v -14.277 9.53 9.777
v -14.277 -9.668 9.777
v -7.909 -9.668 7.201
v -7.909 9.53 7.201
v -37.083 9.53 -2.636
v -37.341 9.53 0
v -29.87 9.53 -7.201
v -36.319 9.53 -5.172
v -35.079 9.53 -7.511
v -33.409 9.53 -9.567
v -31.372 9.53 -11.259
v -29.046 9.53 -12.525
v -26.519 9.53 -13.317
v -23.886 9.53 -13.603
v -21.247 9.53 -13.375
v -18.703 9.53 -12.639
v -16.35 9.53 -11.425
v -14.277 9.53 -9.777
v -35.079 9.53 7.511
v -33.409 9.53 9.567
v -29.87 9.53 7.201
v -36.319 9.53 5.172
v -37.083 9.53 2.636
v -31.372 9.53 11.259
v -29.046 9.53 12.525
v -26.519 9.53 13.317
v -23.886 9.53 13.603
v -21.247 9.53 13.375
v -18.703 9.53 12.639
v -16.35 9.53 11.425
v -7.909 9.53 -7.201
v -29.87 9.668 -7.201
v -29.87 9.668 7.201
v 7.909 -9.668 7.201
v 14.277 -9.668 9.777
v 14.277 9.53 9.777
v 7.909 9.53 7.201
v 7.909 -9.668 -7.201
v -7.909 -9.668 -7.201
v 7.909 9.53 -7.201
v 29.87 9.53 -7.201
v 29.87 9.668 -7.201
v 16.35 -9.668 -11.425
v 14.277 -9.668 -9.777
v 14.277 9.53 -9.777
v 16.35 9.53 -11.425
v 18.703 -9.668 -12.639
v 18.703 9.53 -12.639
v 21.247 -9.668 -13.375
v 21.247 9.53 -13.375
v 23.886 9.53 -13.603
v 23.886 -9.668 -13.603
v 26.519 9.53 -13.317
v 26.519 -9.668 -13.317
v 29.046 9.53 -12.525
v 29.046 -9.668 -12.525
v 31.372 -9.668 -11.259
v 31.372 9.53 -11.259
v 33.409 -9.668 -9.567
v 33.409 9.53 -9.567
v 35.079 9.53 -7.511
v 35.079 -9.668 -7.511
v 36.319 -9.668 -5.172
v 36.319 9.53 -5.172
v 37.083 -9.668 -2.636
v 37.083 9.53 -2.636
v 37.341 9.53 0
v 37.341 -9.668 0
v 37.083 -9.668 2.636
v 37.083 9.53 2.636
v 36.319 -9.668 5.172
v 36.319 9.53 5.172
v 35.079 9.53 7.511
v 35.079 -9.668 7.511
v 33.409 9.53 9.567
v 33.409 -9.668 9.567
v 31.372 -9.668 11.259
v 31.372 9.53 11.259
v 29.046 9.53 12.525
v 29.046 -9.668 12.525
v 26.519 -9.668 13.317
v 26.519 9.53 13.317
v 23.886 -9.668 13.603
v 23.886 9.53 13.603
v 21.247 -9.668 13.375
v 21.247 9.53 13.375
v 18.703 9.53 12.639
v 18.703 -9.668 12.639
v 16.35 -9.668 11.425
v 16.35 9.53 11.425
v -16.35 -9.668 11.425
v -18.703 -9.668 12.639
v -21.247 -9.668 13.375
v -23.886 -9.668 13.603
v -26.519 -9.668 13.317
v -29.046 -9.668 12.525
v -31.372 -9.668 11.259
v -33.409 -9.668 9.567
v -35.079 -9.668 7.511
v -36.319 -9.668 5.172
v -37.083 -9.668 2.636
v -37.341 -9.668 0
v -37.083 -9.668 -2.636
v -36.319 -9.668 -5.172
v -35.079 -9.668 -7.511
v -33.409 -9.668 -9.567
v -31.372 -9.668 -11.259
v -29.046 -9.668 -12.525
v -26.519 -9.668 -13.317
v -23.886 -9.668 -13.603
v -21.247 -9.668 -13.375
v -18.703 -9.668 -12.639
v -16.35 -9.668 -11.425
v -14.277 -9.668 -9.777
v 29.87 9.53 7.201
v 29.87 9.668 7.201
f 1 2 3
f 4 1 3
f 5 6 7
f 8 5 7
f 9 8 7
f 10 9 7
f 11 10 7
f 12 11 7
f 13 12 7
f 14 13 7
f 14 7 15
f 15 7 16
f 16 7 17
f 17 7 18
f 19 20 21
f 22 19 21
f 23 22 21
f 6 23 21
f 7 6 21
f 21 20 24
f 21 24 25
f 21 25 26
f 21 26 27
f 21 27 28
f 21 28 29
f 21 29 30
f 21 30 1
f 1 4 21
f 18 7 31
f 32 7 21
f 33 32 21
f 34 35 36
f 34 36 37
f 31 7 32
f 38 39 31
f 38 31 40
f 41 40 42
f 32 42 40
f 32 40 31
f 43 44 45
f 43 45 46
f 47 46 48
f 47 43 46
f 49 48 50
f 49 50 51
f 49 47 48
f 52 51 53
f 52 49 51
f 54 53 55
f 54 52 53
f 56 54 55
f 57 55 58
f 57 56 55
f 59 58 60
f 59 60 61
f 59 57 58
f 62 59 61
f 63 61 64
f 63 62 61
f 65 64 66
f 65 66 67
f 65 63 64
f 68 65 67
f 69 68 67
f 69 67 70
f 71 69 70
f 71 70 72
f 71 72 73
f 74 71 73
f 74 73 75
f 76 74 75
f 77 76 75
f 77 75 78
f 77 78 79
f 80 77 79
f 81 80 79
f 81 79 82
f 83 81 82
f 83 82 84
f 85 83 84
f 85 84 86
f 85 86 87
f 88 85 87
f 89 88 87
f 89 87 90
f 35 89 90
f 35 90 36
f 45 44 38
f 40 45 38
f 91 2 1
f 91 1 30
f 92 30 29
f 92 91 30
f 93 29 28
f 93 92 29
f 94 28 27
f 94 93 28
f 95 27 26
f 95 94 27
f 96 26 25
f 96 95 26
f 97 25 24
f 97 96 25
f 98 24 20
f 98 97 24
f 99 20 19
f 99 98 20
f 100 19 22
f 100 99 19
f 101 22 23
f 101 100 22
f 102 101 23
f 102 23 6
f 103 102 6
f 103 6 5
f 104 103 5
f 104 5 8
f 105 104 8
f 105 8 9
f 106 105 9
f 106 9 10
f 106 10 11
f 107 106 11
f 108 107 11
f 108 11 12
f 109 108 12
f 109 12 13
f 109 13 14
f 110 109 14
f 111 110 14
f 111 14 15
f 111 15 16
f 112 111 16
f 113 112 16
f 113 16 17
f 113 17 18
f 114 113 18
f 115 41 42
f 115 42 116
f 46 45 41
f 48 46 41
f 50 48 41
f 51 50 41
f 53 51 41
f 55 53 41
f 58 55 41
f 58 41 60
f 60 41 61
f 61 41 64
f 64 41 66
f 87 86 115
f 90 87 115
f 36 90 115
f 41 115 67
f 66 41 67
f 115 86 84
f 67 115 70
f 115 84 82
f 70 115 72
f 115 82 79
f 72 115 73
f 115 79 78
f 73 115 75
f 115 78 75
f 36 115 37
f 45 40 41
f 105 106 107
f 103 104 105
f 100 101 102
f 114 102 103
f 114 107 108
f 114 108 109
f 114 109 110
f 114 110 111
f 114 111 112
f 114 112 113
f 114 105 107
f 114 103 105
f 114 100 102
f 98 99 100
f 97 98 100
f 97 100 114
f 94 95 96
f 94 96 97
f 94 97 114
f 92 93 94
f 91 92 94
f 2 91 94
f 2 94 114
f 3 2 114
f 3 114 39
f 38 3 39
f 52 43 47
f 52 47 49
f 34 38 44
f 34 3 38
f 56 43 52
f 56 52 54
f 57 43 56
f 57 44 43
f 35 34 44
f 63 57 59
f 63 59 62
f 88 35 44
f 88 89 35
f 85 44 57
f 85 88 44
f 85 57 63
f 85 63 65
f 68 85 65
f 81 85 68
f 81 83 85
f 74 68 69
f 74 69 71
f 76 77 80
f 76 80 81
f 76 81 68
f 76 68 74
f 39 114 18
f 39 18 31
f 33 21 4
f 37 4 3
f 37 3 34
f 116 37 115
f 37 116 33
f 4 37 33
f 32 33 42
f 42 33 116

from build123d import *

# Parameters (mm, degrees)
F0_W        = 59.7408041358
F0_H        = 14.4018009305
F1_DEPTH    = 9.66812
F2_R        = 13.6043152125
F3_DEPTH    = 19.19795
F4_T1_DEPTH = 19.19795


# Not quite as in the source:
# - a fillet or chamfer that OpenCascade refuses, or shapes differently, is made with other operations: its cross-section is extruded or revolved along the edge and cut away or added


with BuildPart() as f1:
    # F0 (on Front) → F1 (new body, symmetric)
    with BuildSketch(Plane.XZ):
        Rectangle(F0_W, F0_H)
    extrude(amount=F1_DEPTH, both=True)

    # F2 (on face) → F3 (join)
    with BuildSketch(Plane.XZ.offset(9.66812)):
        with Locations((-23.7363018095, 0)):
            Circle(F2_R)
        with Locations((23.7363018095, 0)):
            Circle(F2_R)
    extrude(amount=-F3_DEPTH)

    # F4: chamfer of 5.08 on 4 edges, made by hand

    # F4_s2 → F4_t1 (join)
    with BuildSketch(Plane.XZ.offset(-9.52983)):
        with BuildLine():
            Line((14.4648728864, 9.8532071559), (7.7209301601, 7.1246894588))
            Line((7.7209301601, 7.1246894588), (7.7209301601, 7.0230894588))
            ThreePointArc((7.7209301601, 7.0230894588), (9.9574717116, 7.0993004653), (12.194013263, 7.0993004653))
            Line((12.194013263, 7.0993004653), (12.2802135971, 7.1471225664))
            ThreePointArc((12.2802135971, 7.1471225664), (13.291854629, 8.5578526047), (14.5355207103, 9.7801904113))
            Line((14.5355207103, 9.7801904113), (14.4648728864, 9.8532071559))
        make_face()
        with BuildLine():
            Line((-14.4648728864, 9.8532071559), (-7.7209301601, 7.1246894588))
            Line((-7.7209301601, 7.1246894588), (-7.7209301601, 7.0230894588))
            ThreePointArc((-7.7209301601, 7.0230894588), (-9.9574717116, 7.0993004653), (-12.194013263, 7.0993004653))
            Line((-12.194013263, 7.0993004653), (-12.2802135971, 7.1471225664))
            ThreePointArc((-12.2802135971, 7.1471225664), (-13.291854629, 8.5578526047), (-14.5355207103, 9.7801904113))
            Line((-14.5355207103, 9.7801904113), (-14.4648728864, 9.8532071559))
        make_face()
        with BuildLine():
            Line((14.4648728864, -9.8532071559), (7.7209301601, -7.1246894588))
            Line((7.7209301601, -7.1246894588), (7.7209301601, -7.0230894588))
            ThreePointArc((7.7209301601, -7.0230894588), (9.9574717116, -7.0993004653), (12.194013263, -7.0993004653))
            Line((12.194013263, -7.0993004653), (12.2802135971, -7.1471225664))
            ThreePointArc((12.2802135971, -7.1471225664), (13.291854629, -8.5578526047), (14.5355207103, -9.7801904113))
            Line((14.5355207103, -9.7801904113), (14.4648728864, -9.8532071559))
        make_face()
        with BuildLine():
            Line((-14.4648728864, -9.8532071559), (-7.7209301601, -7.1246894588))
            Line((-7.7209301601, -7.1246894588), (-7.7209301601, -7.0230894588))
            ThreePointArc((-7.7209301601, -7.0230894588), (-9.9574717116, -7.0993004653), (-12.194013263, -7.0993004653))
            Line((-12.194013263, -7.0993004653), (-12.2802135971, -7.1471225664))
            ThreePointArc((-12.2802135971, -7.1471225664), (-13.291854629, -8.5578526047), (-14.5355207103, -9.7801904113))
            Line((-14.5355207103, -9.7801904113), (-14.4648728864, -9.8532071559))
        make_face()
    extrude(amount=F4_T1_DEPTH)


solid = f1.part
